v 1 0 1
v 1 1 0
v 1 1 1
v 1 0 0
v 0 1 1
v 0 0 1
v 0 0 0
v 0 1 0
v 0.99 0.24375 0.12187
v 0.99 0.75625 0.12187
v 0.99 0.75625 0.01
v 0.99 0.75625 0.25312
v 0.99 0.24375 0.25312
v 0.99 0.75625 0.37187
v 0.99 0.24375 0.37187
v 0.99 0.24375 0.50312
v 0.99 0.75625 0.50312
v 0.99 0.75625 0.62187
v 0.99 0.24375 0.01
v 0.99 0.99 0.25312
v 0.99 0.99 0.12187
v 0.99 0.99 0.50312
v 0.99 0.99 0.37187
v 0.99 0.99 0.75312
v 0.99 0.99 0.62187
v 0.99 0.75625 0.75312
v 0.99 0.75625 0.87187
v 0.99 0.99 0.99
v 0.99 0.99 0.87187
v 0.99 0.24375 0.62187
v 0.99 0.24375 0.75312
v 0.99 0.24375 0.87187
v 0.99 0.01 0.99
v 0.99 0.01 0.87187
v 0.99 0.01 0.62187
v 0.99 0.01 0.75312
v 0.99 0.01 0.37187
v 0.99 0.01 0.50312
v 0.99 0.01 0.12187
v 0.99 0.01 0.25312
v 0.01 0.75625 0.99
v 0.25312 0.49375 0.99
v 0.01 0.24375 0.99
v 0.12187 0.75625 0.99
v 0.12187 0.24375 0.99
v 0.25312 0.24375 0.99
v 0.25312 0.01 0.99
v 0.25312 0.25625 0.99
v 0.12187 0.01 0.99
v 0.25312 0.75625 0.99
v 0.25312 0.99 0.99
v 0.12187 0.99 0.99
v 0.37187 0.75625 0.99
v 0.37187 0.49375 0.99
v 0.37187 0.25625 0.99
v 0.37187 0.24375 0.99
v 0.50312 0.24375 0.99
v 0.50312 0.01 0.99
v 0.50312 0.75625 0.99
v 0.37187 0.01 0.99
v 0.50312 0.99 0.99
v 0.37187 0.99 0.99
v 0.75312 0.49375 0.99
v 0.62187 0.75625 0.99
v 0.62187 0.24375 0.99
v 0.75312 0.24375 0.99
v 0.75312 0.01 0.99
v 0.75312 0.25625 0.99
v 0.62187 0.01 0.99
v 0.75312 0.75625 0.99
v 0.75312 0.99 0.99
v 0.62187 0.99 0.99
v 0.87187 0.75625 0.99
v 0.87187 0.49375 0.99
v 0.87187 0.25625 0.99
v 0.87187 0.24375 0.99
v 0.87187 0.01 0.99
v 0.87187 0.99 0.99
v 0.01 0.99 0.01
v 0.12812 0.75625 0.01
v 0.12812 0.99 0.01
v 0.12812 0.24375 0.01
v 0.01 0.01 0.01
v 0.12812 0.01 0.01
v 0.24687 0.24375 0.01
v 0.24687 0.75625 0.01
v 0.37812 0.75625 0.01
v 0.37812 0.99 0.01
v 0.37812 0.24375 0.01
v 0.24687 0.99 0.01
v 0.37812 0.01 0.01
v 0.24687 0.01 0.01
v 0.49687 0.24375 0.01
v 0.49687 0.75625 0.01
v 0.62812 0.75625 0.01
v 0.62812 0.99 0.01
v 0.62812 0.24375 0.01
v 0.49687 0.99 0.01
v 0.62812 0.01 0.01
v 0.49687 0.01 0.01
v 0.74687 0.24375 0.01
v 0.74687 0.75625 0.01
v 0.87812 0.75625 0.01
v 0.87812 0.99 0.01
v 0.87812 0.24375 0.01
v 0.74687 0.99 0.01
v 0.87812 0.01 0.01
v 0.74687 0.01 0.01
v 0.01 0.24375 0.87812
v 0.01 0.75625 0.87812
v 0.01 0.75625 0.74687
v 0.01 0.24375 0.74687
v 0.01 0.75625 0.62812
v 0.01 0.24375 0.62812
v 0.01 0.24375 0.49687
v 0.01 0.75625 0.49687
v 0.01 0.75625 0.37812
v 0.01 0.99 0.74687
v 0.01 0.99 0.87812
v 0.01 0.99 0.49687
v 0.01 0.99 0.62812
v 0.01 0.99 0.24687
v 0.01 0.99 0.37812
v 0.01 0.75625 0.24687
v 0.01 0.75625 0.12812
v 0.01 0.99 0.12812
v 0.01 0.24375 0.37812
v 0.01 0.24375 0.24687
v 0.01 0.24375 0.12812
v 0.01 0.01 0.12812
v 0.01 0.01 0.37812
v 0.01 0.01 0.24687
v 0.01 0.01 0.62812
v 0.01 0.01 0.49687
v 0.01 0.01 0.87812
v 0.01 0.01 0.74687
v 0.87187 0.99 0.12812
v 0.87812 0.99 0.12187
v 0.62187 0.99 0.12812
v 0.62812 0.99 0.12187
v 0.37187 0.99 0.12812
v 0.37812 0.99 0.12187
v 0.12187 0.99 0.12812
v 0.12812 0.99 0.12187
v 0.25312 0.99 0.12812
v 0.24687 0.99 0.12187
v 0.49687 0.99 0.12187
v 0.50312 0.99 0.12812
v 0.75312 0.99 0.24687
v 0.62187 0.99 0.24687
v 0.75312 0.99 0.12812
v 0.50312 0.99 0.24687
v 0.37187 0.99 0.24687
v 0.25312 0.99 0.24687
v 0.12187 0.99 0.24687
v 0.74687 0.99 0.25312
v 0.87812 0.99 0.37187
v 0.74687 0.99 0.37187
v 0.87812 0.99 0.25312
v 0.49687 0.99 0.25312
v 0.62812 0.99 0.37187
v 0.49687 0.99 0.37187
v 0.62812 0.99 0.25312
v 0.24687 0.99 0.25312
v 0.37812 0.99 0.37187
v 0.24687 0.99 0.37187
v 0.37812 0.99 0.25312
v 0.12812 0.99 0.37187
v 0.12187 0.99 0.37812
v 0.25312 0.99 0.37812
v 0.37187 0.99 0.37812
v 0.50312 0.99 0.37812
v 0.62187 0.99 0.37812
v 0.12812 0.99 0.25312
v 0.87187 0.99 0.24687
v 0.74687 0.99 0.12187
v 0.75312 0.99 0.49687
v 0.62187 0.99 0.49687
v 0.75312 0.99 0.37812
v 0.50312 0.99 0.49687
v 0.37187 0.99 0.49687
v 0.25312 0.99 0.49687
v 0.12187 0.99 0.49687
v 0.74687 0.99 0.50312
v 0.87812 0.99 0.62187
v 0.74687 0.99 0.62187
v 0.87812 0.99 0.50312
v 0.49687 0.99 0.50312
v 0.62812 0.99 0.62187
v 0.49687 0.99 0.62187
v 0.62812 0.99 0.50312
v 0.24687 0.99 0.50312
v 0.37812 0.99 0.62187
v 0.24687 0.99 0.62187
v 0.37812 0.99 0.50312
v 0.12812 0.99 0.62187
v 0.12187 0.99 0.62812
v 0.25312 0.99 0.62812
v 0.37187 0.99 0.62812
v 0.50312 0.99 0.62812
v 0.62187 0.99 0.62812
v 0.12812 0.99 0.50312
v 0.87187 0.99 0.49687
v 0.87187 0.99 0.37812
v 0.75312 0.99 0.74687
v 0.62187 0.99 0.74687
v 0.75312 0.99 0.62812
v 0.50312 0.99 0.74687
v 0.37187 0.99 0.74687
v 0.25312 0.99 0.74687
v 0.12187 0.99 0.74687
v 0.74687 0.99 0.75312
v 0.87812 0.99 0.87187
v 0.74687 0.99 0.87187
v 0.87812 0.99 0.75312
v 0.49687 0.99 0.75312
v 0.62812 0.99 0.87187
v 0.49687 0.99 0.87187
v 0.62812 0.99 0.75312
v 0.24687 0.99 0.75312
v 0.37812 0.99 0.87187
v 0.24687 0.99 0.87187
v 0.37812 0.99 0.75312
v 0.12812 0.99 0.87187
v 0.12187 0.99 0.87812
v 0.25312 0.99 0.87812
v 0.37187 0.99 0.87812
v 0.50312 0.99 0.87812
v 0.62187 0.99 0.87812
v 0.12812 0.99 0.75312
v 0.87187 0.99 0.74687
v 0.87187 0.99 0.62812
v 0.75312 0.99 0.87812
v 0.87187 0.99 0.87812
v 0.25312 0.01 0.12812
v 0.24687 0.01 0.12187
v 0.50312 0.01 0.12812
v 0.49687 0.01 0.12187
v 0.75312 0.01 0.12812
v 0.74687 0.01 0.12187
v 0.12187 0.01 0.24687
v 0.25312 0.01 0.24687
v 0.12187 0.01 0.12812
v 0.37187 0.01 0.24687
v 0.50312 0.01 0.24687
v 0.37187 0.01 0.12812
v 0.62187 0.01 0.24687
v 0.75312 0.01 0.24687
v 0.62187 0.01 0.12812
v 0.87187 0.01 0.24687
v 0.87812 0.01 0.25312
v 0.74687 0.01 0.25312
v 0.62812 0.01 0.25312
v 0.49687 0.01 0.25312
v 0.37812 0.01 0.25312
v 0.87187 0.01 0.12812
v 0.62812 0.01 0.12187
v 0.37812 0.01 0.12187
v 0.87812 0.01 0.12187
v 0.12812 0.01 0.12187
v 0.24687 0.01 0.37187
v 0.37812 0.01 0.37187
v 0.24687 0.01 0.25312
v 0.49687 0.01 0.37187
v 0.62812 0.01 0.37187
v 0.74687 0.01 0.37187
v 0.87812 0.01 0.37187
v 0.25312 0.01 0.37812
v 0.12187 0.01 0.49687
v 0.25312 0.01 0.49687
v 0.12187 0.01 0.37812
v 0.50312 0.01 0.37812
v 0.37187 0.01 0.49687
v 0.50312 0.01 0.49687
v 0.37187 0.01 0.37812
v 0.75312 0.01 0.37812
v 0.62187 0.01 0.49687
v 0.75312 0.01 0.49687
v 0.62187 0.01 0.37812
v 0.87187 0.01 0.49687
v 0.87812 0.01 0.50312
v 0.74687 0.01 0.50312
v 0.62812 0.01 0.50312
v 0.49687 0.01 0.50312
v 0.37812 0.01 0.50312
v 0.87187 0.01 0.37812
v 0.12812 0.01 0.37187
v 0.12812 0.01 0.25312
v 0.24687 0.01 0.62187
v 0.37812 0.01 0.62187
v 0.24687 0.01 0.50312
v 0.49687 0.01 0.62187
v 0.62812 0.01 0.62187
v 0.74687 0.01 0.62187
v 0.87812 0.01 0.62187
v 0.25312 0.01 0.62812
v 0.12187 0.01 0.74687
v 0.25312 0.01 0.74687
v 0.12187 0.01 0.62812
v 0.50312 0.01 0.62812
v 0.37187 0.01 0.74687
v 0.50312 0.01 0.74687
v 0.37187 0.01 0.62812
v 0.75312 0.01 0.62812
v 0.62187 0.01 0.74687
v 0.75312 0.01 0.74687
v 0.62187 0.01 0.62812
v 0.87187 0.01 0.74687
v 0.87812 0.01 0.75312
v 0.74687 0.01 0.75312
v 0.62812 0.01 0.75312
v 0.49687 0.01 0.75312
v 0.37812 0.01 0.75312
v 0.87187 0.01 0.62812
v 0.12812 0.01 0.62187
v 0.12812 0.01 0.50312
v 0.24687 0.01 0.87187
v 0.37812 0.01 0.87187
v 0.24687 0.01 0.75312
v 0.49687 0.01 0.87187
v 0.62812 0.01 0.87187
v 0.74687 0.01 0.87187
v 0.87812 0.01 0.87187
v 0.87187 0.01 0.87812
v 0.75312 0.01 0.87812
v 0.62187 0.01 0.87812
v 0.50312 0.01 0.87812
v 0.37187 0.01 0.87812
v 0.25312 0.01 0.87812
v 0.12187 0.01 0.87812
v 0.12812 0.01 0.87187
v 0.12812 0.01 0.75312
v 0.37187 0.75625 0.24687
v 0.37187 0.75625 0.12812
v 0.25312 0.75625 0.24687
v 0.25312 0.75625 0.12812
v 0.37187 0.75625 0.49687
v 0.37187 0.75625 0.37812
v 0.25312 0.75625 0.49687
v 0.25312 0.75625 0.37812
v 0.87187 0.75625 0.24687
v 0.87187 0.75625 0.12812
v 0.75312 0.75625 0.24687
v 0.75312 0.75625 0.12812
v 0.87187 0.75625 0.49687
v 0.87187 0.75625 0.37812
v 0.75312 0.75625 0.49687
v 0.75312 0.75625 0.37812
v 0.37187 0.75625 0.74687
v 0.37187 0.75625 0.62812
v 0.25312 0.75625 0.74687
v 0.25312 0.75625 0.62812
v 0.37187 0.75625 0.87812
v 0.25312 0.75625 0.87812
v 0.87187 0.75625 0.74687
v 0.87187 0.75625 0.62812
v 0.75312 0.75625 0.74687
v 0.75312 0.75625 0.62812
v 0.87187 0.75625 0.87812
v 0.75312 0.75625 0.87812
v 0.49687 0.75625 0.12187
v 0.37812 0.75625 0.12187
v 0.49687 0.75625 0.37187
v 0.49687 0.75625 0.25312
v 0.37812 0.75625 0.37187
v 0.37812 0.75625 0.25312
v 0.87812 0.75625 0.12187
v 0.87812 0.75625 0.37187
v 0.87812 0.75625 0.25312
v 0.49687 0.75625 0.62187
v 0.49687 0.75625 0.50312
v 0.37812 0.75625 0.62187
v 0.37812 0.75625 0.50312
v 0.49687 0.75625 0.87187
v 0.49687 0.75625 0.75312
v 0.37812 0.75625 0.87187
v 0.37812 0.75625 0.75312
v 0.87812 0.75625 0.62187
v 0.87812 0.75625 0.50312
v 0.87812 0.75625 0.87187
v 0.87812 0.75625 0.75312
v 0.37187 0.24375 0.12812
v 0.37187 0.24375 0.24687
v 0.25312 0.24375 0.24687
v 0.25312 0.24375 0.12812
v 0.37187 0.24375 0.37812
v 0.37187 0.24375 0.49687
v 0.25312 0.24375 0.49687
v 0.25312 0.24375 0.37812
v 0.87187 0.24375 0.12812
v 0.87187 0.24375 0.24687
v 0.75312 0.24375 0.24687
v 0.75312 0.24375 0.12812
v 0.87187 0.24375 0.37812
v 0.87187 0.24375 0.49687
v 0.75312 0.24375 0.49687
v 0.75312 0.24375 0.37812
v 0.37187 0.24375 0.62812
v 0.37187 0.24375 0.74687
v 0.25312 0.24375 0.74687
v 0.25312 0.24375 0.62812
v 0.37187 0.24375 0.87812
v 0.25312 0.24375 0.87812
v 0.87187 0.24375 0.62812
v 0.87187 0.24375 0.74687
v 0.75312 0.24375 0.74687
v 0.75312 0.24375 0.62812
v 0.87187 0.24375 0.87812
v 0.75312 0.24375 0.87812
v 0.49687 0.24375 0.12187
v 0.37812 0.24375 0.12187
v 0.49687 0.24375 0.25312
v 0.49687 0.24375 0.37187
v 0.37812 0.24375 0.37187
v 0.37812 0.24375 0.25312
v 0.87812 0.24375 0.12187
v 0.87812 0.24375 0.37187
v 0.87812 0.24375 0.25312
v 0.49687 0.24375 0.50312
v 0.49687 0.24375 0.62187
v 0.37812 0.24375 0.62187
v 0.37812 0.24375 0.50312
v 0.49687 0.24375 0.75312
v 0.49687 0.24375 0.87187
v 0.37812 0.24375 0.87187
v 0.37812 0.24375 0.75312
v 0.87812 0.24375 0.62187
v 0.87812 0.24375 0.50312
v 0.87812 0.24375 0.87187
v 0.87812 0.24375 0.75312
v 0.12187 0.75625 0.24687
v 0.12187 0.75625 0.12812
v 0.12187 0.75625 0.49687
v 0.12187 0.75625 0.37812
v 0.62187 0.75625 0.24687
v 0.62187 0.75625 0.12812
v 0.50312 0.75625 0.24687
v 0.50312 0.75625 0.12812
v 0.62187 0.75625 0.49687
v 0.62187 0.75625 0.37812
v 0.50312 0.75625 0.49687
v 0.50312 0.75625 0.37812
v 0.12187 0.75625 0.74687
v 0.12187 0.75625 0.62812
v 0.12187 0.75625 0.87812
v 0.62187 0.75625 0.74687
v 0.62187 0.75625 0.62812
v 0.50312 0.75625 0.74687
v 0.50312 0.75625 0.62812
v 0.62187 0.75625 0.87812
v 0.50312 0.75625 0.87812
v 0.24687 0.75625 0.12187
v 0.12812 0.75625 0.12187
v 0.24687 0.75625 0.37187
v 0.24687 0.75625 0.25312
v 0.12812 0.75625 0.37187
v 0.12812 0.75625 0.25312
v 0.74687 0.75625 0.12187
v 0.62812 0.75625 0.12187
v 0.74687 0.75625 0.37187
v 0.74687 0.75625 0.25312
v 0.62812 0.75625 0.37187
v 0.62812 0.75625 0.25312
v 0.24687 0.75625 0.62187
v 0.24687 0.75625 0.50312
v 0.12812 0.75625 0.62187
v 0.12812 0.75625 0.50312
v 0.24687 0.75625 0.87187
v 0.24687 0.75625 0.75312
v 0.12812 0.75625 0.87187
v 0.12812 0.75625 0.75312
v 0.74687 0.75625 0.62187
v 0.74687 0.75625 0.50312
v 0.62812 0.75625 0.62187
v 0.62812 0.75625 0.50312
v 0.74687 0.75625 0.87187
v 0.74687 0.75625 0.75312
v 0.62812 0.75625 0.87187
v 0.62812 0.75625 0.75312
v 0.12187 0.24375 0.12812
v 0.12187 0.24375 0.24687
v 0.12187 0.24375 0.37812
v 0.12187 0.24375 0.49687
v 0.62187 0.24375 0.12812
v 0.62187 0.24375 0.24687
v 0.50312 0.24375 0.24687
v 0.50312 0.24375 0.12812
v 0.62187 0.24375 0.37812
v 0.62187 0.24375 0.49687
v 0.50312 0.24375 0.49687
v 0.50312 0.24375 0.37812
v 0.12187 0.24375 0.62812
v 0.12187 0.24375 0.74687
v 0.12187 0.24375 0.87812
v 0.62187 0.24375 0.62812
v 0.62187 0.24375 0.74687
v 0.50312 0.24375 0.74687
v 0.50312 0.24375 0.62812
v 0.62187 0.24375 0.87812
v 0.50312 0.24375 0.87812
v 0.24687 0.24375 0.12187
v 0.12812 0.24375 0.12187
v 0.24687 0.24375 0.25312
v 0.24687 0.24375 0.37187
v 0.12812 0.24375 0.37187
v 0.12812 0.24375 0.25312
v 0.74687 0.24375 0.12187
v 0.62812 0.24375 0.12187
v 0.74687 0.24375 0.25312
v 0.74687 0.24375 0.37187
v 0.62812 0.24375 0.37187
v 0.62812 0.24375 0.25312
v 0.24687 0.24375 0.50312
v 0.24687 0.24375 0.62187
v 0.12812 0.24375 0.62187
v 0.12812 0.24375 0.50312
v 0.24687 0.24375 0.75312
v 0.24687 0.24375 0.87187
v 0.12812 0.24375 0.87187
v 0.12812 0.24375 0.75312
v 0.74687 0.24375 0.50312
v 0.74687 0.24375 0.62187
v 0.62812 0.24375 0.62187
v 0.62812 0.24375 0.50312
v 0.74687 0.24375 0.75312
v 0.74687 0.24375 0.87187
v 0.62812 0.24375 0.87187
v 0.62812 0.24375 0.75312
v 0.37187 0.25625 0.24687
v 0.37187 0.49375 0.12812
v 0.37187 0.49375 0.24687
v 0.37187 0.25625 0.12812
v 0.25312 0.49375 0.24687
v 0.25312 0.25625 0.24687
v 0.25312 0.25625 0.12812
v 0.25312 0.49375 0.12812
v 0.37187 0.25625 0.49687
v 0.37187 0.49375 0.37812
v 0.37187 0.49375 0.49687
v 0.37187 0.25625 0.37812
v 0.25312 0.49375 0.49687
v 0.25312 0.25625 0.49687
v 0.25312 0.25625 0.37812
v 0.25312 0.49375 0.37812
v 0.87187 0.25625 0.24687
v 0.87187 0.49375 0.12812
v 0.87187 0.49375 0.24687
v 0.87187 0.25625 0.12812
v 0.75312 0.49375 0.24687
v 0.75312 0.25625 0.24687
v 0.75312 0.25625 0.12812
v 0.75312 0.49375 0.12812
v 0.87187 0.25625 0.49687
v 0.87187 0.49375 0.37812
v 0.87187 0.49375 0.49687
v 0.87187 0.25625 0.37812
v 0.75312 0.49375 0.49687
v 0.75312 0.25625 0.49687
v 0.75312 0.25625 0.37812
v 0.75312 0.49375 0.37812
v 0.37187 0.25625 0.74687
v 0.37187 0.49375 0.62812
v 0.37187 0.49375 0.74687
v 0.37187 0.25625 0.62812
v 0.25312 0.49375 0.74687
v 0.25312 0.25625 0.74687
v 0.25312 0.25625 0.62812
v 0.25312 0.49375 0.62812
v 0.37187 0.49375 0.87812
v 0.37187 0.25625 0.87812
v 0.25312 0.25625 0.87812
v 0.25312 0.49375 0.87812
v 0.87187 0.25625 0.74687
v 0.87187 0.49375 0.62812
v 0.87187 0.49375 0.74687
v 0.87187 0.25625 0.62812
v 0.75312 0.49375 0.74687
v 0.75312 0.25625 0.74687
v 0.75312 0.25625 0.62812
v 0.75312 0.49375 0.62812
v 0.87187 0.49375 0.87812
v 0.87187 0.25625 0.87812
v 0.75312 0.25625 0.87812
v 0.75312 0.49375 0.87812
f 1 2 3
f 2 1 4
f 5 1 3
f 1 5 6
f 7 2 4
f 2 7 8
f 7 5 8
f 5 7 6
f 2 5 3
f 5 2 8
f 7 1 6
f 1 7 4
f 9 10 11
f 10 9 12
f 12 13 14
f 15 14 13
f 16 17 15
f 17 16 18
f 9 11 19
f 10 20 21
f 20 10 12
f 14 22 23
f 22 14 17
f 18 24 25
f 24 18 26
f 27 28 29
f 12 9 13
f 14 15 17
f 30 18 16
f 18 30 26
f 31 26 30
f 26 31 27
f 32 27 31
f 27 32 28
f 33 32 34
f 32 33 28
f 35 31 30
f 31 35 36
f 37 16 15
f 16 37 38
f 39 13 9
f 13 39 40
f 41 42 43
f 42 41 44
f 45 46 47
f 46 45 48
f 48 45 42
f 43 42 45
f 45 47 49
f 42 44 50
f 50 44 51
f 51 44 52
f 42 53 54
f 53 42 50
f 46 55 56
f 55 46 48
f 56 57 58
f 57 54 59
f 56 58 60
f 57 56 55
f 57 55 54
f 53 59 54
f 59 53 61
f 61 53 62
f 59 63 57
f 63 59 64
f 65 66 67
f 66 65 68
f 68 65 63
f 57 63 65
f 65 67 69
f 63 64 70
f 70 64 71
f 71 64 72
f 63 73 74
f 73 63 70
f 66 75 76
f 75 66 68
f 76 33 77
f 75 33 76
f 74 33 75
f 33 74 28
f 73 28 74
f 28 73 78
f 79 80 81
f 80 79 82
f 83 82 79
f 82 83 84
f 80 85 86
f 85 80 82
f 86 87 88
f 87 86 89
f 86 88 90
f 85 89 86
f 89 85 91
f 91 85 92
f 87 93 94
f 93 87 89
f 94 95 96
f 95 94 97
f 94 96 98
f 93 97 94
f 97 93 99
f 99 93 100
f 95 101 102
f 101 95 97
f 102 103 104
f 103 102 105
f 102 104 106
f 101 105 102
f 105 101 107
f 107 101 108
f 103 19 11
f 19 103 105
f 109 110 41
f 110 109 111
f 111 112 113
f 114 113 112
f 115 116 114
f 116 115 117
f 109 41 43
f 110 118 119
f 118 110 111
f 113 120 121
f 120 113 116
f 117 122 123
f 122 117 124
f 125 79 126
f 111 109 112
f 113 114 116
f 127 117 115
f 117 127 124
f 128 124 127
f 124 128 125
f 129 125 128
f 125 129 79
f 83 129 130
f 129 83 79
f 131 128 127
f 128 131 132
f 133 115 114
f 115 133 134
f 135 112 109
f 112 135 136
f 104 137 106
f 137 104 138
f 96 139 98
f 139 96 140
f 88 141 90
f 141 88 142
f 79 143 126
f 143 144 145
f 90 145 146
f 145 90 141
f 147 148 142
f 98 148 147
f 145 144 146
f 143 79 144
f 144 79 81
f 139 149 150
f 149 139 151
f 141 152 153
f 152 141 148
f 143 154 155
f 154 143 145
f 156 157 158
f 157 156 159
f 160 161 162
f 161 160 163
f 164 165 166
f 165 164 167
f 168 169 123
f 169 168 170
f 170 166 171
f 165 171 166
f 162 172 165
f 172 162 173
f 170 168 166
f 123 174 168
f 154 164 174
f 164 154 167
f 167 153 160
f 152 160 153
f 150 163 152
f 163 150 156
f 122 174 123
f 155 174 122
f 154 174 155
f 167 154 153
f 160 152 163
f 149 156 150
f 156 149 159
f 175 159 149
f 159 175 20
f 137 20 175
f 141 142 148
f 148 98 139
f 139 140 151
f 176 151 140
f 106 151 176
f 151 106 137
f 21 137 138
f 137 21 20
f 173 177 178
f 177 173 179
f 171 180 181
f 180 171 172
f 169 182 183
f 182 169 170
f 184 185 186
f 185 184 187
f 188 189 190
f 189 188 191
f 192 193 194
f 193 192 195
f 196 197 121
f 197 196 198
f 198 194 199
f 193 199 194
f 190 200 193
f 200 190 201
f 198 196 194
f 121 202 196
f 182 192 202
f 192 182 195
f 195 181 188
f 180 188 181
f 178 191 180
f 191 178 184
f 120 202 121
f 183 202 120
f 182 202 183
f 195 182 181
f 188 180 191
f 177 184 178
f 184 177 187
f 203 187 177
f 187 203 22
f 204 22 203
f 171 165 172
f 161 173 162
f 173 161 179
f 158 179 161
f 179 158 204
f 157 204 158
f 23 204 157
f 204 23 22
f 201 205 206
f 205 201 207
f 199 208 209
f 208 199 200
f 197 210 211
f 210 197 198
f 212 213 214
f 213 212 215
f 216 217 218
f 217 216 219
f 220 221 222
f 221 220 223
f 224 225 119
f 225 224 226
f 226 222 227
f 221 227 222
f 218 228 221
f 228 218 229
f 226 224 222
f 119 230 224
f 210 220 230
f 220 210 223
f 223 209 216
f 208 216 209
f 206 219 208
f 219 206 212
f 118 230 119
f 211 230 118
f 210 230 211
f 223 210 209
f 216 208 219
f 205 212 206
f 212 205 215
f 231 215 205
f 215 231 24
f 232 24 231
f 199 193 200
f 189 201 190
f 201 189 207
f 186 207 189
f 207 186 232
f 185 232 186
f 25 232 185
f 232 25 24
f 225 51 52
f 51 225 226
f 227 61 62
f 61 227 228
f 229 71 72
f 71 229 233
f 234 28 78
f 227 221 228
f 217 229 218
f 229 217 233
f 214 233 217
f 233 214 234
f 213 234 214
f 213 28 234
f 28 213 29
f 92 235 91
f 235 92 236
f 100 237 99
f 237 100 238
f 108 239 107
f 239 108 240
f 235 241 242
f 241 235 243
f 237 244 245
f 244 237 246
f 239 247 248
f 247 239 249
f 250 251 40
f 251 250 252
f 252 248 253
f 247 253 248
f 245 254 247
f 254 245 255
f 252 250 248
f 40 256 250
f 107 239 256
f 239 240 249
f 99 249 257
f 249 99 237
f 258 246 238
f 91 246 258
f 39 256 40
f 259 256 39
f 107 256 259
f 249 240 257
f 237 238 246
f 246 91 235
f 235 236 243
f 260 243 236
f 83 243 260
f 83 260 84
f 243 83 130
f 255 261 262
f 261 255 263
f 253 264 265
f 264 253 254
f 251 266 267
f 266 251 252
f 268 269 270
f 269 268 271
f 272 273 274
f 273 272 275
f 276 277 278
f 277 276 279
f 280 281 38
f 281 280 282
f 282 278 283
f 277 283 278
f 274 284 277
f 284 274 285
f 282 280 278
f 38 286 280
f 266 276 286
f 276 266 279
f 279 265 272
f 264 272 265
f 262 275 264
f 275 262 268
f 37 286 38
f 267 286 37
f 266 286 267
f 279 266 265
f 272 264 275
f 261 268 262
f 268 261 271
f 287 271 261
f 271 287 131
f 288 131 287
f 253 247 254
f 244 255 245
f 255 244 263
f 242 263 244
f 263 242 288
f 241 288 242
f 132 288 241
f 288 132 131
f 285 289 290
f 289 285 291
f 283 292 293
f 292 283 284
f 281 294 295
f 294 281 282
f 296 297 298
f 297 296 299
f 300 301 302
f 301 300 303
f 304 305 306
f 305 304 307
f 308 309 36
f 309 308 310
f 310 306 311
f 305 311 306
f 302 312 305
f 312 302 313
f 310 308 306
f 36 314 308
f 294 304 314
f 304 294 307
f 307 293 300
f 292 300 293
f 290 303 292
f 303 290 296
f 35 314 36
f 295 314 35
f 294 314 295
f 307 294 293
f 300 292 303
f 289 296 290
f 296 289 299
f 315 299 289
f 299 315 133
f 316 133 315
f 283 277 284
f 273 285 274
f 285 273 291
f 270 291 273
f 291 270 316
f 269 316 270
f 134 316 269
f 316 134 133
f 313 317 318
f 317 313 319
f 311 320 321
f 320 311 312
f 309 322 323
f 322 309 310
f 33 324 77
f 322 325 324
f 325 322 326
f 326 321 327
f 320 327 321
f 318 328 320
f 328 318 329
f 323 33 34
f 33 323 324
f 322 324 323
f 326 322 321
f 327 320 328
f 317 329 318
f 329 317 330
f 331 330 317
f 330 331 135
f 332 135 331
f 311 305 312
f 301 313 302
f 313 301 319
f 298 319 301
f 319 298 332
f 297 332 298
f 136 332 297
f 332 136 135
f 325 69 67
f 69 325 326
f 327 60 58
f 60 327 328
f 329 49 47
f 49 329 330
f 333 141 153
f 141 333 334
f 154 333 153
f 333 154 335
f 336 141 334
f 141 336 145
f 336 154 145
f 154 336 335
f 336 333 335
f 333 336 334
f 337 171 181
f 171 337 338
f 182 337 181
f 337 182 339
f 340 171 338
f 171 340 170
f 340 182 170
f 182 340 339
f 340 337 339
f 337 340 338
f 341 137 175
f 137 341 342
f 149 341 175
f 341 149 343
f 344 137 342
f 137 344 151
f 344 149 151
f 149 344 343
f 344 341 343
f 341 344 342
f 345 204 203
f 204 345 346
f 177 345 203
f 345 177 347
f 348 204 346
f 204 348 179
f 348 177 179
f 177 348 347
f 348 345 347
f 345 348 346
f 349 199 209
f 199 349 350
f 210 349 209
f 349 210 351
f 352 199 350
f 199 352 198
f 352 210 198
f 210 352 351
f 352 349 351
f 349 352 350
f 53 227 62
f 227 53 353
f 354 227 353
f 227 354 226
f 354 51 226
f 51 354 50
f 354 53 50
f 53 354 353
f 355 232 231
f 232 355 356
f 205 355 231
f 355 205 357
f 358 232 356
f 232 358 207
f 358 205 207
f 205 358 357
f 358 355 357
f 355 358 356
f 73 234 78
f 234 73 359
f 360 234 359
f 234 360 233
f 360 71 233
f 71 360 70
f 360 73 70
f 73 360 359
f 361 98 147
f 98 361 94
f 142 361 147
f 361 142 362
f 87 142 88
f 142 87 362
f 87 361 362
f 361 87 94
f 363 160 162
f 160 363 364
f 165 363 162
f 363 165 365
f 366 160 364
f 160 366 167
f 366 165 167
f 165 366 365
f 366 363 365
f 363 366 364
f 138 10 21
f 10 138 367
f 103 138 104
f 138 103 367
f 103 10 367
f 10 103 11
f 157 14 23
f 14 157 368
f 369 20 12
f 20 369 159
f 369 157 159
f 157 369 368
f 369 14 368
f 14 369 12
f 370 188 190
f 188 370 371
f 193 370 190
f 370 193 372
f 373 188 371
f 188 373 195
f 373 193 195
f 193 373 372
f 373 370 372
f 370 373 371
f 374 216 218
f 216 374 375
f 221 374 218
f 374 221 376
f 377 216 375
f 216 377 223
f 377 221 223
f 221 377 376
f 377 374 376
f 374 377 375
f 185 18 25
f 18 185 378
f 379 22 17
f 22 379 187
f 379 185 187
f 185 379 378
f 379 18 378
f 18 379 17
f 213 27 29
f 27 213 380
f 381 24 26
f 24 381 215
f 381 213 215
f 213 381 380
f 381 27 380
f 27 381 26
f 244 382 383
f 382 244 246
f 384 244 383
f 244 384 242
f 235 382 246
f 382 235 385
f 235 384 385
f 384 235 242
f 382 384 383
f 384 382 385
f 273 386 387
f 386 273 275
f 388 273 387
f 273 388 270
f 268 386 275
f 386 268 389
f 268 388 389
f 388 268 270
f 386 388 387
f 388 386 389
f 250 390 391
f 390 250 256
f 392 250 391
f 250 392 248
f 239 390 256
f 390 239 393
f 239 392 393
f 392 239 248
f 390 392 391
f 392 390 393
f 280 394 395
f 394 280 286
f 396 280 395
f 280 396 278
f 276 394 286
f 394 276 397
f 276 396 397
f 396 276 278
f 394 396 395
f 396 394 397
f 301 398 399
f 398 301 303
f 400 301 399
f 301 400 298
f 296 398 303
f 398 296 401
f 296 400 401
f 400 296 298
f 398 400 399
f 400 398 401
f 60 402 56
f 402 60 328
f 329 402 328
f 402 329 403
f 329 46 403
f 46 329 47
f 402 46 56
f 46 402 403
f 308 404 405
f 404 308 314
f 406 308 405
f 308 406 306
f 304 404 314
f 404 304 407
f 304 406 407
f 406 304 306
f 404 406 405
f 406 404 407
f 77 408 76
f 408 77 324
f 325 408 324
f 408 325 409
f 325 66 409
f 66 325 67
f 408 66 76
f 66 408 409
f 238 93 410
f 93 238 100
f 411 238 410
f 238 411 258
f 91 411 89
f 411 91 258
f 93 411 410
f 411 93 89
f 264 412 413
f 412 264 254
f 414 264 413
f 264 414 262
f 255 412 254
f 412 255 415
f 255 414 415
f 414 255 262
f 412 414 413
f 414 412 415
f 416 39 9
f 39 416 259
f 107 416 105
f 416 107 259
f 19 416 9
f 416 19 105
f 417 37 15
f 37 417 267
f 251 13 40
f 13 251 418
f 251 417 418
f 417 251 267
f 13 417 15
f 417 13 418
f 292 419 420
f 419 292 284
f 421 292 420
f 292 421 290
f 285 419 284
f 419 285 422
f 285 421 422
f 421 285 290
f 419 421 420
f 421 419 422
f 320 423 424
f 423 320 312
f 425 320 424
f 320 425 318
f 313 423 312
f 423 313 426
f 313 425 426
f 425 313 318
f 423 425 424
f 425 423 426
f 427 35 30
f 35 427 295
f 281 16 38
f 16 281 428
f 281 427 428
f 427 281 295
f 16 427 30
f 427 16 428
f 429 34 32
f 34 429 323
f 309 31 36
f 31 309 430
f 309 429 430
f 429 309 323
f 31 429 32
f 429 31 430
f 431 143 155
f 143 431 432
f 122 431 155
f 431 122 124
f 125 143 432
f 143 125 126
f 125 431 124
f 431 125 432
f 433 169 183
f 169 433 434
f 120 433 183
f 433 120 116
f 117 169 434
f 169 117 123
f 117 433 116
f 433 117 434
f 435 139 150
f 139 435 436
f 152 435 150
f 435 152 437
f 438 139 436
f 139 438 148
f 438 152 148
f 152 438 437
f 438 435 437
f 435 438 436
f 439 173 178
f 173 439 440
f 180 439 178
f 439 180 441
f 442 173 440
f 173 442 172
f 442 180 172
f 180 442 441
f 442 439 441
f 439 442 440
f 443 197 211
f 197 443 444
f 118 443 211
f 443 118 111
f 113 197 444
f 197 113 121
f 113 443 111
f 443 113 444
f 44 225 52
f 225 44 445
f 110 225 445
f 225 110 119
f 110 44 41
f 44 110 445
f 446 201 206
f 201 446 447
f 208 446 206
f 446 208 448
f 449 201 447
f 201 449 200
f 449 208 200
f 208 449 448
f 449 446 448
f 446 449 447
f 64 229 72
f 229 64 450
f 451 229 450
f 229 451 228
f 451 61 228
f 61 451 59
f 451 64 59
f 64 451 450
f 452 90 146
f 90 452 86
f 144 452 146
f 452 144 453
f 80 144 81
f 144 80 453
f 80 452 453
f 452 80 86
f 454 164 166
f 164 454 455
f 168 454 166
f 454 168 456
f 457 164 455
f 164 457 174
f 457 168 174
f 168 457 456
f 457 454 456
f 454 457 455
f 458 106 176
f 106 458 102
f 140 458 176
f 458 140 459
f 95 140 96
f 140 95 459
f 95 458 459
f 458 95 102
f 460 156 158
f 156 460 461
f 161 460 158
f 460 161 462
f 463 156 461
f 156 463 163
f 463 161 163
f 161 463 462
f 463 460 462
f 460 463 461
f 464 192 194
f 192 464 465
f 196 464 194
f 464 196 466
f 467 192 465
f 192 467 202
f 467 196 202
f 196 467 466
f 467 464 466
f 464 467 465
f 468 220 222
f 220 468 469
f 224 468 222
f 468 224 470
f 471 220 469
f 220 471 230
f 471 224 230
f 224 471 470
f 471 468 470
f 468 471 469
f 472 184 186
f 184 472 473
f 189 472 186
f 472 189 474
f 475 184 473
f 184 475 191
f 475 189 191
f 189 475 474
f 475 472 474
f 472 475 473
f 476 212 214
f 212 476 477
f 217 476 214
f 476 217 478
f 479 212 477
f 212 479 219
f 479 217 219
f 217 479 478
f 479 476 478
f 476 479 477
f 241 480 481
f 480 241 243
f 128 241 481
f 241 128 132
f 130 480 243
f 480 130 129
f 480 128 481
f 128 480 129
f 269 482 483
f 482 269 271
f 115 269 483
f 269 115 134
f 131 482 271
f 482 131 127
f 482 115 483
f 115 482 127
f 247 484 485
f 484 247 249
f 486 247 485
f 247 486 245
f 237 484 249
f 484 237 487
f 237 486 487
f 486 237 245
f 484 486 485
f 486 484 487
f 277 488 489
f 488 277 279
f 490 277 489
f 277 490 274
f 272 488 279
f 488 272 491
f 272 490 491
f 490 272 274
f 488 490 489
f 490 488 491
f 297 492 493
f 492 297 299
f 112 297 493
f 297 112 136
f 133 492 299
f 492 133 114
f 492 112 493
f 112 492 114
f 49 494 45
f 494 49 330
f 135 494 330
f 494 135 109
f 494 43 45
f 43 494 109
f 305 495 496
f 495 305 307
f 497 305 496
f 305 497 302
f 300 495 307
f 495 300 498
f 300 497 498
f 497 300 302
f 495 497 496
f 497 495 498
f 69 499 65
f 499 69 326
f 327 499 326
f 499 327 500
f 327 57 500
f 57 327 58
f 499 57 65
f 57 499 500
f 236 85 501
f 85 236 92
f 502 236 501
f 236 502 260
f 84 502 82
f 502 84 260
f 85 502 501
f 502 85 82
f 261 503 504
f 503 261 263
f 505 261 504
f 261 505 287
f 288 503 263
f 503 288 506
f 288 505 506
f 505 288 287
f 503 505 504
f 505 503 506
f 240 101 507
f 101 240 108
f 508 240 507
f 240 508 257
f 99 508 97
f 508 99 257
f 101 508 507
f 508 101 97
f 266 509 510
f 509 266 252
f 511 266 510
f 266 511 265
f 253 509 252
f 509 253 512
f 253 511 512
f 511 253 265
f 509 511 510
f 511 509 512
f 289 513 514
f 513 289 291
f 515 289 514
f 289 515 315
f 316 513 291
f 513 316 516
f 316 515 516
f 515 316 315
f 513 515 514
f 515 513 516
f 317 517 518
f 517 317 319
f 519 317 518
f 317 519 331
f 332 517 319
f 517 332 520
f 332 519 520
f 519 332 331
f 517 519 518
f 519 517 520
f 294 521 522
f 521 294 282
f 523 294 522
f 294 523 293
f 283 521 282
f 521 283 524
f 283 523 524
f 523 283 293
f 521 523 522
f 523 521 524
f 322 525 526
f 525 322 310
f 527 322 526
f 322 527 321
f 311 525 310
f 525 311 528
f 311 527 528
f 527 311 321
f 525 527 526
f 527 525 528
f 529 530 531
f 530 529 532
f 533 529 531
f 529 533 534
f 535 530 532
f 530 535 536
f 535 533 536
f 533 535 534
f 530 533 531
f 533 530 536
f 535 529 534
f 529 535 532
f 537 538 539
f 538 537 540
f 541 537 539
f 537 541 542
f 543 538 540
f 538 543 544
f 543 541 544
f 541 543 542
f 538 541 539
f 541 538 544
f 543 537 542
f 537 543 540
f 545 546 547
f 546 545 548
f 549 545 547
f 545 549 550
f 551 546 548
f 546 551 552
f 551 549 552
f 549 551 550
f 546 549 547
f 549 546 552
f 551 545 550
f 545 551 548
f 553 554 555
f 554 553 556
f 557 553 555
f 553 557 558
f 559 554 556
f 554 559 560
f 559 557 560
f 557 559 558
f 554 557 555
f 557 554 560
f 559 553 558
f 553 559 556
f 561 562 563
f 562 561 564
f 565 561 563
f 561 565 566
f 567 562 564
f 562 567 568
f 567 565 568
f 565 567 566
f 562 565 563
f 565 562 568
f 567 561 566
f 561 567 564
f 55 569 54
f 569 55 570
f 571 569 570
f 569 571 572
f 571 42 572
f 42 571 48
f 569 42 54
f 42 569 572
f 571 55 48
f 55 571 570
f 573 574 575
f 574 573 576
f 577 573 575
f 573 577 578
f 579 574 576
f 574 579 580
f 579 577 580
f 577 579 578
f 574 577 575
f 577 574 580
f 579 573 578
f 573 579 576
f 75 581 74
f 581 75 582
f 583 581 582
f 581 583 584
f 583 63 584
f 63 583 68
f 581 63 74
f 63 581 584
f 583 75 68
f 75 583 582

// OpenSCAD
translate([0.3125, 0.875, 0.1875]) color([0.4730816887644065, 0.4811976310590197, 0.1525002512517103]) cube([0.11875, 0.2375, 0.11875], center=true);
translate([0.3125, 0.875, 0.4375]) color([0.2781773942097905, 0.11622833389686305, 0.6108769961788691]) cube([0.11875, 0.2375, 0.11875], center=true);
translate([0.8125, 0.875, 0.1875]) color([0.6057624527332056, 0.1196475362356878, 0.8469715162496533]) cube([0.11875, 0.2375, 0.11875], center=true);
translate([0.8125, 0.875, 0.4375]) color([0.16675545113857337, 0.4506205276965459, 0.9920609611299942]) cube([0.11875, 0.2375, 0.11875], center=true);
translate([0.3125, 0.875, 0.6875]) color([0.6401675344357308, 0.29412419979588433, 0.7017486543298701]) cube([0.11875, 0.2375, 0.11875], center=true);
translate([0.3125, 0.875, 0.9375]) color([0.04580628709253409, 0.9935319256492151, 0.7787263018667503]) cube([0.11875, 0.2375, 0.11875], center=true);
translate([0.8125, 0.875, 0.6875]) color([0.6567175822539838, 0.22409333609011917, 0.2173138962360971]) cube([0.11875, 0.2375, 0.11875], center=true);
translate([0.8125, 0.875, 0.9375]) color([0.4889514850882859, 0.33216179351413366, 0.5445090697106568]) cube([0.11875, 0.2375, 0.11875], center=true);
translate([0.4375, 0.875, 0.0625]) color([0.8186404471177132, 0.31823092991428015, 0.7835204513338085]) cube([0.11875, 0.2375, 0.11875], center=true);
translate([0.4375, 0.875, 0.3125]) color([0.3317571407769251, 0.7471655902439052, 0.49330839926944825]) cube([0.11875, 0.2375, 0.11875], center=true);
translate([0.9375, 0.875, 0.0625]) color([0.31687050913425496, 0.40722254522372425, 0.8885496813676853]) cube([0.11875, 0.2375, 0.11875], center=true);
translate([0.9375, 0.875, 0.3125]) color([0.43820451516064185, 0.5876709367610928, 0.8409967709289158]) cube([0.11875, 0.2375, 0.11875], center=true);
translate([0.4375, 0.875, 0.5625]) color([0.6197079432008021, 0.38556401521388095, 0.2475008197610784]) cube([0.11875, 0.2375, 0.11875], center=true);
translate([0.4375, 0.875, 0.8125]) color([0.8429426407721735, 0.32634284309429806, 0.13707580610342385]) cube([0.11875, 0.2375, 0.11875], center=true);
translate([0.9375, 0.875, 0.5625]) color([0.3598423368728554, 0.264731590317016, 0.51709157361475]) cube([0.11875, 0.2375, 0.11875], center=true);
translate([0.9375, 0.875, 0.8125]) color([0.17487606372639242, 0.9466893986532771, 0.66313473725421]) cube([0.11875, 0.2375, 0.11875], center=true);
translate([0.3125, 0.125, 0.1875]) color([0.79256768730916, 0.5299868750344031, 0.0037122234066482296]) cube([0.11875, 0.2375, 0.11875], center=true);
translate([0.3125, 0.125, 0.4375]) color([0.3346797329668444, 0.2299690308436897, 0.6556195280311976]) cube([0.11875, 0.2375, 0.11875], center=true);
translate([0.8125, 0.125, 0.1875]) color([0.12765999006508022, 0.8057966425062643, 0.43035428169849255]) cube([0.11875, 0.2375, 0.11875], center=true);
translate([0.8125, 0.125, 0.4375]) color([0.422400495510202, 0.9199635173449774, 0.11011080890222513]) cube([0.11875, 0.2375, 0.11875], center=true);
translate([0.3125, 0.125, 0.6875]) color([0.5215130083201278, 0.30078179458822674, 0.2823653163422336]) cube([0.11875, 0.2375, 0.11875], center=true);
translate([0.3125, 0.125, 0.9375]) color([0.1560907456556755, 0.24942984069191787, 0.28678866723957996]) cube([0.11875, 0.2375, 0.11875], center=true);
translate([0.8125, 0.125, 0.6875]) color([0.2633422273153584, 0.7104714165455356, 0.11737342720160504]) cube([0.11875, 0.2375, 0.11875], center=true);
translate([0.8125, 0.125, 0.9375]) color([0.3508763000282499, 0.08479557417219075, 0.27260462269356756]) cube([0.11875, 0.2375, 0.11875], center=true);
translate([0.4375, 0.125, 0.0625]) color([0.07263716691807287, 0.17879086101485508, 0.508299467974341]) cube([0.11875, 0.2375, 0.11875], center=true);
translate([0.4375, 0.125, 0.3125]) color([0.902956825006488, 0.8370451955994361, 0.044684354128986636]) cube([0.11875, 0.2375, 0.11875], center=true);
translate([0.9375, 0.125, 0.0625]) color([0.6555106807730096, 0.10296943345413578, 0.3519866605161641]) cube([0.11875, 0.2375, 0.11875], center=true);
translate([0.9375, 0.125, 0.3125]) color([0.5853549512671524, 0.8820773046922987, 0.5593659453022324]) cube([0.11875, 0.2375, 0.11875], center=true);
translate([0.4375, 0.125, 0.5625]) color([0.7868636013924064, 0.8663882409733605, 0.36051036263596925]) cube([0.11875, 0.2375, 0.11875], center=true);
translate([0.4375, 0.125, 0.8125]) color([0.609114220260537, 0.8179264108515125, 0.13172222480882523]) cube([0.11875, 0.2375, 0.11875], center=true);
translate([0.9375, 0.125, 0.5625]) color([0.8706050188987864, 0.032462240435694456, 0.9913595050346956]) cube([0.11875, 0.2375, 0.11875], center=true);
translate([0.9375, 0.125, 0.8125]) color([0.539242818912043, 0.8025886498821879, 0.8705566752928521]) cube([0.11875, 0.2375, 0.11875], center=true);
translate([0.0625, 0.875, 0.1875]) color([0.1976190886654201, 0.900596983759861, 0.18009883394648962]) cube([0.11875, 0.2375, 0.11875], center=true);
translate([0.0625, 0.875, 0.4375]) color([0.6022069127238148, 0.7071334762525083, 0.008205705122538709]) cube([0.11875, 0.2375, 0.11875], center=true);
translate([0.5625, 0.875, 0.1875]) color([0.31998535440689924, 0.7717970129670944, 0.8268118548875305]) cube([0.11875, 0.2375, 0.11875], center=true);
translate([0.5625, 0.875, 0.4375]) color([0.44664959093225387, 0.9000748390820571, 0.5878614560054999]) cube([0.11875, 0.2375, 0.11875], center=true);
translate([0.0625, 0.875, 0.6875]) color([0.8833895156792425, 0.2796118162121404, 0.9426095677736448]) cube([0.11875, 0.2375, 0.11875], center=true);
translate([0.0625, 0.875, 0.9375]) color([0.212191689354298, 0.49205593032233996, 0.4453770067496924]) cube([0.11875, 0.2375, 0.11875], center=true);
translate([0.5625, 0.875, 0.6875]) color([0.9293842899711038, 0.8820738797295198, 0.48372273244744746]) cube([0.11875, 0.2375, 0.11875], center=true);
translate([0.5625, 0.875, 0.9375]) color([0.4919072075126587, 0.46538069241375346, 0.04047649008661647]) cube([0.11875, 0.2375, 0.11875], center=true);
translate([0.1875, 0.875, 0.0625]) color([0.05188503165287672, 0.7127741150476583, 0.04497924898519212]) cube([0.11875, 0.2375, 0.11875], center=true);
translate([0.1875, 0.875, 0.3125]) color([0.5236170046672227, 0.5907854733054855, 0.16883632428149886]) cube([0.11875, 0.2375, 0.11875], center=true);
translate([0.6875, 0.875, 0.0625]) color([0.6352720853972567, 0.027978247710975568, 0.3124430895798276]) cube([0.11875, 0.2375, 0.11875], center=true);
translate([0.6875, 0.875, 0.3125]) color([0.31957665043348893, 0.6559085853337698, 0.7437106657654887]) cube([0.11875, 0.2375, 0.11875], center=true);
translate([0.1875, 0.875, 0.5625]) color([0.07832412146199108, 0.45620218285708003, 0.6876458166859714]) cube([0.11875, 0.2375, 0.11875], center=true);
translate([0.1875, 0.875, 0.8125]) color([0.9636291355600387, 0.878123081309952, 0.12816255107423769]) cube([0.11875, 0.2375, 0.11875], center=true);
translate([0.6875, 0.875, 0.5625]) color([0.47528865625356587, 0.944696538942446, 0.451500314081945]) cube([0.11875, 0.2375, 0.11875], center=true);
translate([0.6875, 0.875, 0.8125]) color([0.9244863054094172, 0.2818112065930072, 0.5510527632935076]) cube([0.11875, 0.2375, 0.11875], center=true);
translate([0.0625, 0.125, 0.1875]) color([0.675857778082816, 0.5869258223152402, 0.2847362216416969]) cube([0.11875, 0.2375, 0.11875], center=true);
translate([0.0625, 0.125, 0.4375]) color([0.635909748587162, 0.729315237788191, 0.5637787691555437]) cube([0.11875, 0.2375, 0.11875], center=true);
translate([0.5625, 0.125, 0.1875]) color([0.30776080923305105, 0.5560402393659957, 0.33281107506552277]) cube([0.11875, 0.2375, 0.11875], center=true);
translate([0.5625, 0.125, 0.4375]) color([0.8340656646802972, 0.05278750107332808, 0.995543977034447]) cube([0.11875, 0.2375, 0.11875], center=true);
translate([0.0625, 0.125, 0.6875]) color([0.37683133793083945, 0.7760122026792906, 0.25429004617060047]) cube([0.11875, 0.2375, 0.11875], center=true);
translate([0.0625, 0.125, 0.9375]) color([0.9496462854565422, 0.492344018517461, 0.48327369374291285]) cube([0.11875, 0.2375, 0.11875], center=true);
translate([0.5625, 0.125, 0.6875]) color([0.9956852293153085, 0.12222654829913548, 0.6417388043997139]) cube([0.11875, 0.2375, 0.11875], center=true);
translate([0.5625, 0.125, 0.9375]) color([0.1505237499401939, 0.19604468256183094, 0.5880433581219213]) cube([0.11875, 0.2375, 0.11875], center=true);
translate([0.1875, 0.125, 0.0625]) color([0.5913648679499125, 0.3524731668985618, 0.0821739220806692]) cube([0.11875, 0.2375, 0.11875], center=true);
translate([0.1875, 0.125, 0.3125]) color([0.20363831854830872, 0.3614503921410671, 0.4104075672486597]) cube([0.11875, 0.2375, 0.11875], center=true);
translate([0.6875, 0.125, 0.0625]) color([0.6271120096838282, 0.9428965707637007, 0.6098779572446081]) cube([0.11875, 0.2375, 0.11875], center=true);
translate([0.6875, 0.125, 0.3125]) color([0.017786728150397946, 0.7576240533275508, 0.1851614345707312]) cube([0.11875, 0.2375, 0.11875], center=true);
translate([0.1875, 0.125, 0.5625]) color([0.9255180964821261, 0.12122394629946098, 0.9357014569054868]) cube([0.11875, 0.2375, 0.11875], center=true);
translate([0.1875, 0.125, 0.8125]) color([0.39173716630466404, 0.2533970099892773, 0.4946669716393419]) cube([0.11875, 0.2375, 0.11875], center=true);
translate([0.6875, 0.125, 0.5625]) color([0.6243823384362844, 0.8922382644133762, 0.3970934130345041]) cube([0.11875, 0.2375, 0.11875], center=true);
translate([0.6875, 0.125, 0.8125]) color([0.9509731679750747, 0.005106942517287827, 0.9545812052908477]) cube([0.11875, 0.2375, 0.11875], center=true);
translate([0.3125, 0.375, 0.1875]) color([0.8629111967644169, 0.5463327783546498, 0.8622694015077594]) cube([0.11875, 0.2375, 0.11875], center=true);
translate([0.3125, 0.375, 0.4375]) color([0.506514810987362, 0.39571063247098726, 0.3815587054449151]) cube([0.11875, 0.2375, 0.11875], center=true);
translate([0.8125, 0.375, 0.1875]) color([0.9884775910810554, 0.9910417069672124, 0.9309886156814967]) cube([0.11875, 0.2375, 0.11875], center=true);
translate([0.8125, 0.375, 0.4375]) color([0.45470107761565004, 0.007786647172324246, 0.8136535384907204]) cube([0.11875, 0.2375, 0.11875], center=true);
translate([0.3125, 0.375, 0.6875]) color([0.29708363745890076, 0.290462847812445, 0.212873396390442]) cube([0.11875, 0.2375, 0.11875], center=true);
translate([0.3125, 0.375, 0.9375]) color([0.01791743415042668, 0.6632907356961544, 0.13839598780688578]) cube([0.11875, 0.2375, 0.11875], center=true);
translate([0.8125, 0.375, 0.6875]) color([0.6960773790098471, 0.4663371104821591, 0.5687814940050228]) cube([0.11875, 0.2375, 0.11875], center=true);
translate([0.8125, 0.375, 0.9375]) color([0.990219214964545, 0.5953085291496046, 0.018431443861099517]) cube([0.11875, 0.2375, 0.11875], center=true);
color([0.3,0.3,0.3,0.3]) difference() { cube([1,1,1]); translate([0.01,0.01,0.01]) cube([0.98,0.98,0.98]); }
